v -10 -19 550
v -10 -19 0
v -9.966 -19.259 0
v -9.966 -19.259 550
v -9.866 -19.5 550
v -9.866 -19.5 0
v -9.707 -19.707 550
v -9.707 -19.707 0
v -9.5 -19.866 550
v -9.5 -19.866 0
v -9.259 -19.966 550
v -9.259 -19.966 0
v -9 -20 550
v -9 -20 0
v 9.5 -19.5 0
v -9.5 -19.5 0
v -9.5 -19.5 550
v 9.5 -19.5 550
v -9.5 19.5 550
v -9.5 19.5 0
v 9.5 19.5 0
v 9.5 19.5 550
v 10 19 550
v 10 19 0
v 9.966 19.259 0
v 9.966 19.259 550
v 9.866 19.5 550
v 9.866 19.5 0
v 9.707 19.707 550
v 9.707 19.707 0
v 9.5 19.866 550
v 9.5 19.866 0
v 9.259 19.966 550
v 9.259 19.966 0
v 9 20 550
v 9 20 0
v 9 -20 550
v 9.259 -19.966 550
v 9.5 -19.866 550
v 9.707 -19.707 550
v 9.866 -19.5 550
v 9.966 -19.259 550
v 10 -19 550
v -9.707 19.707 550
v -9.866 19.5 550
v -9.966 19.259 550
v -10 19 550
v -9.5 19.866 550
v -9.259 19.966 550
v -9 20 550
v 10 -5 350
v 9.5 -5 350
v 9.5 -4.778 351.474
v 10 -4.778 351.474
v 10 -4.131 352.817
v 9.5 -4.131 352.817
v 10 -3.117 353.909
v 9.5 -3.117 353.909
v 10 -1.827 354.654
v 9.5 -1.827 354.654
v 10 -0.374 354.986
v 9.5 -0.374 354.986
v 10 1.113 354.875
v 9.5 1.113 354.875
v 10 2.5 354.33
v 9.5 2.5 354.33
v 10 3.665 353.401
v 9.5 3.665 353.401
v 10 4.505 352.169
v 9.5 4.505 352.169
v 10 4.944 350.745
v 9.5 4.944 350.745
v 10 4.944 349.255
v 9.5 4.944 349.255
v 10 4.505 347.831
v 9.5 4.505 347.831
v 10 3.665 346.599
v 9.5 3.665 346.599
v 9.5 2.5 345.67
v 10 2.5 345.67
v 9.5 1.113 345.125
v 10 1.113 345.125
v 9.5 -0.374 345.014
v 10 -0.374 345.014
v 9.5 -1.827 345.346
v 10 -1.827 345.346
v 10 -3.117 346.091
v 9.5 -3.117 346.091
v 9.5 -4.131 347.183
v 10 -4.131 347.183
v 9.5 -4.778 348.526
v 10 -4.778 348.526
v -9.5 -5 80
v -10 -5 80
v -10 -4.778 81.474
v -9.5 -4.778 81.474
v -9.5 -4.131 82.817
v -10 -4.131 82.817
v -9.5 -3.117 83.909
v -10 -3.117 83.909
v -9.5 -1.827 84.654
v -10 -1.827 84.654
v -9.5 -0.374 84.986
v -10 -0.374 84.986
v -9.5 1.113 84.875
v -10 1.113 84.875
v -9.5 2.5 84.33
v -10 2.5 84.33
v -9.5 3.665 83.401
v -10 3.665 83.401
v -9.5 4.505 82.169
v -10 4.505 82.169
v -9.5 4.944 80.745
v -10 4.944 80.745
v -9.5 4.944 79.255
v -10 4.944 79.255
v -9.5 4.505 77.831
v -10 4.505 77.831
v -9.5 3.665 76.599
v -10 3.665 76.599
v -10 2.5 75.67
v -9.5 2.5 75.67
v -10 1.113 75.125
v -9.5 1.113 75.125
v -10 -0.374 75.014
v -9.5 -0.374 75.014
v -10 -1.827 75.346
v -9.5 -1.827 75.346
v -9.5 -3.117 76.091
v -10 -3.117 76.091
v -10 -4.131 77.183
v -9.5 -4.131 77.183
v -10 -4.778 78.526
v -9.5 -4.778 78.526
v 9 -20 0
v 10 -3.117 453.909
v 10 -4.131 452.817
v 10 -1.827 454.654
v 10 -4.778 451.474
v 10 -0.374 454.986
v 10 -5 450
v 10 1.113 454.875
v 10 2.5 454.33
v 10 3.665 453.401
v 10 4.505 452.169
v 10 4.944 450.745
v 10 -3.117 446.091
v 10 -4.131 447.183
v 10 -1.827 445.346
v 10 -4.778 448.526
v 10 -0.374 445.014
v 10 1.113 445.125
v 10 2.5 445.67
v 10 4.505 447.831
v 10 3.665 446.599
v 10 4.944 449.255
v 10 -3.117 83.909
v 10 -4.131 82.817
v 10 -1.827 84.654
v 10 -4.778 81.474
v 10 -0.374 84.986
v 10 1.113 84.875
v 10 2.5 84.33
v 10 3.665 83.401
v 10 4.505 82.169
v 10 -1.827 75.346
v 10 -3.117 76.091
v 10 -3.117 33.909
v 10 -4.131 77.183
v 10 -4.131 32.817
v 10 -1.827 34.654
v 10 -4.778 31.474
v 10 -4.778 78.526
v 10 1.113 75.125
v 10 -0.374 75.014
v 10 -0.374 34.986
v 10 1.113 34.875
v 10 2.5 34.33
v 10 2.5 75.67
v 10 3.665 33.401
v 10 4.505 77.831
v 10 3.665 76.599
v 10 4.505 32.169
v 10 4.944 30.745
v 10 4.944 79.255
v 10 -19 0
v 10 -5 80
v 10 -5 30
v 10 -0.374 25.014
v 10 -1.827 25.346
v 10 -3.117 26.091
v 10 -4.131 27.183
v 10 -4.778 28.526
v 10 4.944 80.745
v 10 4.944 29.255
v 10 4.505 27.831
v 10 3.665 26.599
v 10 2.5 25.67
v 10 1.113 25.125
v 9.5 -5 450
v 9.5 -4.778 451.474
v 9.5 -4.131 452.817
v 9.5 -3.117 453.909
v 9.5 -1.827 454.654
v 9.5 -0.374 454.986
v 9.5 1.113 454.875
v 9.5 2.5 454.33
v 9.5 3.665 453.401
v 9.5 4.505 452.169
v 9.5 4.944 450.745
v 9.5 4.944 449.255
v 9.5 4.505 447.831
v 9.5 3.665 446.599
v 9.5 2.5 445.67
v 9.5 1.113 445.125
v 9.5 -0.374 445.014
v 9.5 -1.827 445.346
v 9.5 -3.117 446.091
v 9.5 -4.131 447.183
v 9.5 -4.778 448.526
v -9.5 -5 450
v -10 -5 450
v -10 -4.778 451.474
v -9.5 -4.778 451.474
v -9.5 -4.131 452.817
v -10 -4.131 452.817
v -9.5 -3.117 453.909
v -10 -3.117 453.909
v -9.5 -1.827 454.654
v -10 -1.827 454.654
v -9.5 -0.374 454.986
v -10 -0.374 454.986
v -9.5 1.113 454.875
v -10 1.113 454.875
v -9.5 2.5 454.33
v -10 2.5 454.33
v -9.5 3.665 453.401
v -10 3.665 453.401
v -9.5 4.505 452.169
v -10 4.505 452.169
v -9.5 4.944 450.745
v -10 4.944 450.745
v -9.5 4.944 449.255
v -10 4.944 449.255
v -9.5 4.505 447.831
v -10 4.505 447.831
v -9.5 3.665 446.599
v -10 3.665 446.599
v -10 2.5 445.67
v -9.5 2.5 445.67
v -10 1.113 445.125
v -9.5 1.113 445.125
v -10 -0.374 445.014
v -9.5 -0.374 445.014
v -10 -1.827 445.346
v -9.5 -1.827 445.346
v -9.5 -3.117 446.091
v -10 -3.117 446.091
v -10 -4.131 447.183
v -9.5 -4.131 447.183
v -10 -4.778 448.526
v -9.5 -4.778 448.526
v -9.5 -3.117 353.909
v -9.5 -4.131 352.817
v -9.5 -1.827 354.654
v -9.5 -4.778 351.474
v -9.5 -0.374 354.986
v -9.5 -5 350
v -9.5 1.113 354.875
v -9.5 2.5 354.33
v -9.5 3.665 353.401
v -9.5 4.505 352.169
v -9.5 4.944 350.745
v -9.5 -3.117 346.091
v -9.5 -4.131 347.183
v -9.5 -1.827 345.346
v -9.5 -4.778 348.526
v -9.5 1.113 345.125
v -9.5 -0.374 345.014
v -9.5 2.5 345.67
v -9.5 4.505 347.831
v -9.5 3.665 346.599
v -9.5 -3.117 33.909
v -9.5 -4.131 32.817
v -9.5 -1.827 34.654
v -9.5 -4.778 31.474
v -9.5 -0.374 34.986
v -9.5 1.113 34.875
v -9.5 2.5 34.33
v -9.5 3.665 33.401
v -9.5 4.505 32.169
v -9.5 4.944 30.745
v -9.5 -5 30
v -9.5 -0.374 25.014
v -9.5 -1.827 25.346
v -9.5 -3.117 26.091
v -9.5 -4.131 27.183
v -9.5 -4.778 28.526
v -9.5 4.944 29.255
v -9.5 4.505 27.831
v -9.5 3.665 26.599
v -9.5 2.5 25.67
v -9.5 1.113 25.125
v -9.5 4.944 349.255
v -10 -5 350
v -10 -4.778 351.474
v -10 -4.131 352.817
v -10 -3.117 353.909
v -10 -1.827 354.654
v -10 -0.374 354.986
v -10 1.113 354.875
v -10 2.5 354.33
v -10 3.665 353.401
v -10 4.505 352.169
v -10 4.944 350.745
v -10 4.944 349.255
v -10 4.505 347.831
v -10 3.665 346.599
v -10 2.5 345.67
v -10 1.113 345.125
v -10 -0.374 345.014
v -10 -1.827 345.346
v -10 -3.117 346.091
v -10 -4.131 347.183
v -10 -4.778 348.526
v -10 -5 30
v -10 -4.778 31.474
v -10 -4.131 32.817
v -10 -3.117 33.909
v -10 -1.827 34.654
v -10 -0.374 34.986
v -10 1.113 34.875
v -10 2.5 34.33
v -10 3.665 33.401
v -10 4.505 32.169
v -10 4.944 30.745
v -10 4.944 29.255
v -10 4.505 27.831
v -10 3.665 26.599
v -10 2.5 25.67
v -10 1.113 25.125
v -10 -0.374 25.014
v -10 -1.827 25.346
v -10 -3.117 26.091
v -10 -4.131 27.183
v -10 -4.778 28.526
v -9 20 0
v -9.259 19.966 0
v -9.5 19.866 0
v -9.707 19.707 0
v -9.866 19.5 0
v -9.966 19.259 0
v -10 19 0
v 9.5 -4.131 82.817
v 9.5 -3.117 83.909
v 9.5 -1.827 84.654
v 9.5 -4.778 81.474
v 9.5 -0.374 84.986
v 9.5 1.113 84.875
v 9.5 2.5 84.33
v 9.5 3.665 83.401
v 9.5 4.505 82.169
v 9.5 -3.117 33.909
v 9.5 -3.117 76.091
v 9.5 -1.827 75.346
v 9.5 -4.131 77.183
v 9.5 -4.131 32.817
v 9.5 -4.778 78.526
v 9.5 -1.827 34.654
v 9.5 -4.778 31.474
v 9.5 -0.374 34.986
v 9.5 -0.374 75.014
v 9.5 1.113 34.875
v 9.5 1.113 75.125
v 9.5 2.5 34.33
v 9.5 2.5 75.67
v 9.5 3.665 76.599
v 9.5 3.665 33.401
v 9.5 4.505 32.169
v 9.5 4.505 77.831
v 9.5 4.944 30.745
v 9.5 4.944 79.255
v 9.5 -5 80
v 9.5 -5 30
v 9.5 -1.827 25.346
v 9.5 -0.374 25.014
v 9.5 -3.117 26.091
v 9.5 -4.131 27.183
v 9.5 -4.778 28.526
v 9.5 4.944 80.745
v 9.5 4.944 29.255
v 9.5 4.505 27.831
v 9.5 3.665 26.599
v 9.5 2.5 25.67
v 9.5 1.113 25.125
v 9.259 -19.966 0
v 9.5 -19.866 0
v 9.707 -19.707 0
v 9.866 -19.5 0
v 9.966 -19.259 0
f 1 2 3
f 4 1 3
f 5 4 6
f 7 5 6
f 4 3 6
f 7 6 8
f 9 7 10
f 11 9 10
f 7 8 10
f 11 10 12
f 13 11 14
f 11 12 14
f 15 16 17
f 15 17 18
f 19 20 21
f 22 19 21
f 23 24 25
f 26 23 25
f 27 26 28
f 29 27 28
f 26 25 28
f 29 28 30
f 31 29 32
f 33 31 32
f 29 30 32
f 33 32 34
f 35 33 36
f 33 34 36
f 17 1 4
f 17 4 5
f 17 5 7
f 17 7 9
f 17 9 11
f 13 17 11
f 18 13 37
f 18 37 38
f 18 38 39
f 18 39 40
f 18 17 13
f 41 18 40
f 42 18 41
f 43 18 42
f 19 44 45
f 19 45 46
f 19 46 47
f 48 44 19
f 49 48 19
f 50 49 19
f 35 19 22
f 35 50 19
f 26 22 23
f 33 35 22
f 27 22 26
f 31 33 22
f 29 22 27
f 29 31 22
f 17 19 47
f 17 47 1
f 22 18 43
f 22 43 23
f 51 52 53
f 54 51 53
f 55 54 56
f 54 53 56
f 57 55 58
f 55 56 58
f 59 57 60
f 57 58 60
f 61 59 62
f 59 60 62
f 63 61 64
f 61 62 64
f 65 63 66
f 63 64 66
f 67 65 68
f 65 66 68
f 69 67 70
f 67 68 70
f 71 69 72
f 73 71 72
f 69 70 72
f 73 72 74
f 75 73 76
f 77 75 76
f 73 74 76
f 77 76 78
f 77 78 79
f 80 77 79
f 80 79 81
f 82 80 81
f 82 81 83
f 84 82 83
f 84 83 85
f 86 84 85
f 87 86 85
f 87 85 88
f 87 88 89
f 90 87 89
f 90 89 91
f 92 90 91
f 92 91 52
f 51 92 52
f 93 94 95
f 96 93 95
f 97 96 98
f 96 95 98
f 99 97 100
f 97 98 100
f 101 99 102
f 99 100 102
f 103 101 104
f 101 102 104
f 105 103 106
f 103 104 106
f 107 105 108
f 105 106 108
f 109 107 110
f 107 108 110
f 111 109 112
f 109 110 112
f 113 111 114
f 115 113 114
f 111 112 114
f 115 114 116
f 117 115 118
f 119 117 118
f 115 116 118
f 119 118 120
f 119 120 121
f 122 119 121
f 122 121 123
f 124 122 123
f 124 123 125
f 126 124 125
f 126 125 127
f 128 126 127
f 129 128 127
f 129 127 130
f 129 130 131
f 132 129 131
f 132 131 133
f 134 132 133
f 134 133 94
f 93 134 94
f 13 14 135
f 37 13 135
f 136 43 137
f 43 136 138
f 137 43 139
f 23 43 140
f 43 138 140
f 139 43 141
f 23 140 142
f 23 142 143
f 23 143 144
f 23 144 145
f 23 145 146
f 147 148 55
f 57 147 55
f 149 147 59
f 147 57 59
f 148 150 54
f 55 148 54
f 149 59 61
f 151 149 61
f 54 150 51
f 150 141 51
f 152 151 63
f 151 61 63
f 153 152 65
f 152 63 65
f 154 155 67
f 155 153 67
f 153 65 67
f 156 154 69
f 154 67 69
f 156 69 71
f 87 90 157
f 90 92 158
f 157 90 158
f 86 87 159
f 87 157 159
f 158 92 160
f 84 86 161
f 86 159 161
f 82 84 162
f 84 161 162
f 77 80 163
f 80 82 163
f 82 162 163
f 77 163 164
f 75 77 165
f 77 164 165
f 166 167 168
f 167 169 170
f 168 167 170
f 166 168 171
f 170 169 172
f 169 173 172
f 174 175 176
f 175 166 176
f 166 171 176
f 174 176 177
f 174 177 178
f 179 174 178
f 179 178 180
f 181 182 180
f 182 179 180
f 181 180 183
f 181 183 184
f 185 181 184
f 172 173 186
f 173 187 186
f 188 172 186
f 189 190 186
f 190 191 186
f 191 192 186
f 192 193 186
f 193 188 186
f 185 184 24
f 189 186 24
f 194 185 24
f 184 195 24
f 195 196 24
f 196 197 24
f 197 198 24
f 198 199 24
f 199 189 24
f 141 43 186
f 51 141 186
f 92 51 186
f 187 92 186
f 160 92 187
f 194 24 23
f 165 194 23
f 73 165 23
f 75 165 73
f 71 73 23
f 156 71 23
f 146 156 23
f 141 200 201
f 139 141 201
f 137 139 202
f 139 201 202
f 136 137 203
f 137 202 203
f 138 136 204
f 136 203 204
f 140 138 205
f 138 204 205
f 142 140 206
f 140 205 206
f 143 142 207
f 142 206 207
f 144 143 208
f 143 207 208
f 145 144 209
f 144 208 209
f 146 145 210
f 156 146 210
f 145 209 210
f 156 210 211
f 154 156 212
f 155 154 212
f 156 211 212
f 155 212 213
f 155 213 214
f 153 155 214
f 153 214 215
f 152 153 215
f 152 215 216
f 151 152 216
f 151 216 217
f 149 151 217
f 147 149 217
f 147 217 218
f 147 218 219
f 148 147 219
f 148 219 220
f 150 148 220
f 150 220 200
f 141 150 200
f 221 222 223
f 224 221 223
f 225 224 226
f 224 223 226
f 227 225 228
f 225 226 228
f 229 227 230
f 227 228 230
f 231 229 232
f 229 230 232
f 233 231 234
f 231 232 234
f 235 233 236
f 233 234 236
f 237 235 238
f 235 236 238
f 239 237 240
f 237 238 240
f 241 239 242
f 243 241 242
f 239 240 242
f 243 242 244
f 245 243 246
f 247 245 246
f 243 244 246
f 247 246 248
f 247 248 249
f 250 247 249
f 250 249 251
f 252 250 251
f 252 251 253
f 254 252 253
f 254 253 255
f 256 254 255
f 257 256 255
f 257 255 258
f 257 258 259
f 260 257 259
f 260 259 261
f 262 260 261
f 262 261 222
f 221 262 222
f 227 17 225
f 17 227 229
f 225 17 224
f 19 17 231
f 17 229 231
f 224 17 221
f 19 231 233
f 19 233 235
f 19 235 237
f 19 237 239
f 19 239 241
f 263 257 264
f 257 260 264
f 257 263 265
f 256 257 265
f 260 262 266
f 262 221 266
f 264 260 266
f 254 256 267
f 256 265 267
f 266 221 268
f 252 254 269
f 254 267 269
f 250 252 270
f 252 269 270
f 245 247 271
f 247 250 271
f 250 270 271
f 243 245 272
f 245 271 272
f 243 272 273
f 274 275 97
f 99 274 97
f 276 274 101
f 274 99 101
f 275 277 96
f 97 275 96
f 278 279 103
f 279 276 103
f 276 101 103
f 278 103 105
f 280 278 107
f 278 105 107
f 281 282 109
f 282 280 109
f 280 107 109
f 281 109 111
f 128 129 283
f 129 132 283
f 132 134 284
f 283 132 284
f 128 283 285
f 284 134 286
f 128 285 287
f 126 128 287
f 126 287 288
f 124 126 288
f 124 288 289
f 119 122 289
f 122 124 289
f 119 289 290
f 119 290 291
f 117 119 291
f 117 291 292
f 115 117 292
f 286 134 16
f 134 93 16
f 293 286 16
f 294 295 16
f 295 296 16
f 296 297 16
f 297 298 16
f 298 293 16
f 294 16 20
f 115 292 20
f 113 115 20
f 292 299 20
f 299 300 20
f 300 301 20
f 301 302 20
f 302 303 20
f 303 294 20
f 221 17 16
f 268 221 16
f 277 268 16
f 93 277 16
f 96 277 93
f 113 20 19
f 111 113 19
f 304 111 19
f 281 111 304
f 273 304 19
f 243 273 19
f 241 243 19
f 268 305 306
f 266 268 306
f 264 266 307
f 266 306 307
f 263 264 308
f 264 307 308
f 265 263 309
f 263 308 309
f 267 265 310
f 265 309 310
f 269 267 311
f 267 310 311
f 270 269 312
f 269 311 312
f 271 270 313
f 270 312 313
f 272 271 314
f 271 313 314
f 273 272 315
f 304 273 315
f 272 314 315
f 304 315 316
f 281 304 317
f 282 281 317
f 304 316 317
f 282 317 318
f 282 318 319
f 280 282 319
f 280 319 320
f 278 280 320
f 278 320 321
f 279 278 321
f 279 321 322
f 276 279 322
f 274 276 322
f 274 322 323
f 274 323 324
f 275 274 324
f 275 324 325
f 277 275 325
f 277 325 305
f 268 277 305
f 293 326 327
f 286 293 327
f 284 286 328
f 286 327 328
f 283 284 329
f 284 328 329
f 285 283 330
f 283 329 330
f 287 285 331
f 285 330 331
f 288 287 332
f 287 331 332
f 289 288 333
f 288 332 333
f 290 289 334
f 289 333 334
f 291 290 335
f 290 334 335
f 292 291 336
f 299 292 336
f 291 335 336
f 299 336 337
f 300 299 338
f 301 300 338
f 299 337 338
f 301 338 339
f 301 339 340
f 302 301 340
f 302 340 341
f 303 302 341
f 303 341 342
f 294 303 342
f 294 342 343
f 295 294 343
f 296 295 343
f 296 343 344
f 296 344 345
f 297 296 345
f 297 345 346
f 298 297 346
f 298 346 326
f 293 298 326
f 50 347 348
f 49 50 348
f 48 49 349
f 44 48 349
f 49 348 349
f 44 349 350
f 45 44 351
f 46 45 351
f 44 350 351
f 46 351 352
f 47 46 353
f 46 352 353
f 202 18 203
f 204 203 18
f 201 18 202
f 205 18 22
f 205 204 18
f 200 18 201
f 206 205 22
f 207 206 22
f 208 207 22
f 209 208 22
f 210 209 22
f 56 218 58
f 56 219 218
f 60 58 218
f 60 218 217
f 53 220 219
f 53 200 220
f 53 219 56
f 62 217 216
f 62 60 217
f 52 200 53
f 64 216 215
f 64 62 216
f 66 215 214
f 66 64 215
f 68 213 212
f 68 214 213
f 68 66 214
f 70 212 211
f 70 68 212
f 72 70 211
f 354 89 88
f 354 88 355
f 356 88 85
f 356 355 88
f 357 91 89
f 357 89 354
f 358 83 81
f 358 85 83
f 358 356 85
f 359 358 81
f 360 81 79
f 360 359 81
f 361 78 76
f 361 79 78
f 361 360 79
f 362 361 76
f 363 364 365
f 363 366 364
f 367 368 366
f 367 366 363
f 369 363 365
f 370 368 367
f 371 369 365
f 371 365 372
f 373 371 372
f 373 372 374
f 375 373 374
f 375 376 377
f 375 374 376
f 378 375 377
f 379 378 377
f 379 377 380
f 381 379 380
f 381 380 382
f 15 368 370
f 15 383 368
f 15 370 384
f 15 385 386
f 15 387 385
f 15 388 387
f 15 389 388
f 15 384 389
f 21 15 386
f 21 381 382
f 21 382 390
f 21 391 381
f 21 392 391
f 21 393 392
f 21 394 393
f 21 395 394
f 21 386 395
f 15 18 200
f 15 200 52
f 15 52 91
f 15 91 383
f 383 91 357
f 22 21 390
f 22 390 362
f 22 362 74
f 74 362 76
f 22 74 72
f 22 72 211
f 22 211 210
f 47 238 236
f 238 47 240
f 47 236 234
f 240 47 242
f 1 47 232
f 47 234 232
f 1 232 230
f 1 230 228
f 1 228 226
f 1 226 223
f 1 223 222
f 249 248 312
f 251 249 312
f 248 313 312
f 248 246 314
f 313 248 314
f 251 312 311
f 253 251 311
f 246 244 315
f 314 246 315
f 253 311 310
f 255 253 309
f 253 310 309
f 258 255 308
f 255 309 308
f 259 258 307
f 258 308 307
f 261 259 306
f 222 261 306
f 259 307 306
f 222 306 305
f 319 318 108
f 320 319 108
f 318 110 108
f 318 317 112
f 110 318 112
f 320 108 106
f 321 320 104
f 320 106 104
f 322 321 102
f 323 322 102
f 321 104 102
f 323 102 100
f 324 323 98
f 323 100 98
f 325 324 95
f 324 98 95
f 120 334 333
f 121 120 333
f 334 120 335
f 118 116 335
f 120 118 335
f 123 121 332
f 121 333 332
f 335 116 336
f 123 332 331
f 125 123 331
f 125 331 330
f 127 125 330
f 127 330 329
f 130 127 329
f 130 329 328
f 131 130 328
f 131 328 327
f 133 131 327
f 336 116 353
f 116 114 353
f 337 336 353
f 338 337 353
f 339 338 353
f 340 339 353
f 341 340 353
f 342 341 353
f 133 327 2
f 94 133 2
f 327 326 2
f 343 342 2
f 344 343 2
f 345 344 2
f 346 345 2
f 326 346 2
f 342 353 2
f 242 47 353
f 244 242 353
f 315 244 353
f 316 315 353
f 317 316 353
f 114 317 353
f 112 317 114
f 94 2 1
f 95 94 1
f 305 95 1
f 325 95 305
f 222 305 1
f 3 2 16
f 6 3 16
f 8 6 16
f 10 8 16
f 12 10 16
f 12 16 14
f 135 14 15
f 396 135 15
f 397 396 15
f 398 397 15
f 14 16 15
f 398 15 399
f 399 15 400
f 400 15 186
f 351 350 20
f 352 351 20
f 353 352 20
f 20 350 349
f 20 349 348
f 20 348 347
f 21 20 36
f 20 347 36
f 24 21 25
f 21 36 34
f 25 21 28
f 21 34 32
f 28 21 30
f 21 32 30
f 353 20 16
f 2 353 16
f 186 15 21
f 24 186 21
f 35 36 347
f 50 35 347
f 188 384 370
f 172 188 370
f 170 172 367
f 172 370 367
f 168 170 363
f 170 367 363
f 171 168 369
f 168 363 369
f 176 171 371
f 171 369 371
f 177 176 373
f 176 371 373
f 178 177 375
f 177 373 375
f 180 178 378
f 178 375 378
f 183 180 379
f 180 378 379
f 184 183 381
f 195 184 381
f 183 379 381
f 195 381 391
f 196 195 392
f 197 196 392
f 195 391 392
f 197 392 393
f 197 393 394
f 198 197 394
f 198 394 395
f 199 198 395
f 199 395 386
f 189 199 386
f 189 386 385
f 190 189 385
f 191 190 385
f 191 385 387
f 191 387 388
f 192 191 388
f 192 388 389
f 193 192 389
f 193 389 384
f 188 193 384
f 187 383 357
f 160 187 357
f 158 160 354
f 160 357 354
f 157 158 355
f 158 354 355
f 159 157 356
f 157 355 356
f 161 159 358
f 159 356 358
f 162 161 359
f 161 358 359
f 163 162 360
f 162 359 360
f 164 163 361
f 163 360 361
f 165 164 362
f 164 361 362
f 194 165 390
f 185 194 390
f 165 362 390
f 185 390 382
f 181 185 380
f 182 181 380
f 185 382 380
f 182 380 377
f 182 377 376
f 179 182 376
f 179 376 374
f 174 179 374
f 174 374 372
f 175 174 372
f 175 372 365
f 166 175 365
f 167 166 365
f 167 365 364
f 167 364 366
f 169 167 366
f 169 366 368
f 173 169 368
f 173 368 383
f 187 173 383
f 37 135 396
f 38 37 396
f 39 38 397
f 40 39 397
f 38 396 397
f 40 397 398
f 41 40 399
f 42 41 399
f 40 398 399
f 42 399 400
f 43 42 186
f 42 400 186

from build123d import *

# Parameters (mm, degrees)
F0_W     = 19
F0_H     = 39
F1_DEPTH = 550
F3_D     = 10
F3_DEPTH = 30
F3_TIP   = 3.0043030951


# Not quite as in the source:
# - a feature names something its author has since deleted; it is built from what else it names


with BuildPart() as f1:
    # F0 (on Top) → F1 (new body)
    with BuildSketch(Plane.XY):
        with BuildLine():
            Line((9, 20), (-9, 20))
            ThreePointArc((-9, 20), (-9.7071067812, 19.7071067812), (-10, 19))
            Line((-10, 19), (-10, -19))
            ThreePointArc((-10, -19), (-9.7071067812, -19.7071067812), (-9, -20))
            Line((-9, -20), (9, -20))
            ThreePointArc((9, -20), (9.7071067812, -19.7071067812), (10, -19))
            Line((10, -19), (10, 19))
            ThreePointArc((10, 19), (9.7071067812, 19.7071067812), (9, 20))
        make_face()
        Rectangle(F0_W, F0_H, mode=Mode.SUBTRACT)
    extrude(amount=F1_DEPTH)

    # F3
    with Locations(Plane.YZ.offset(10)):
        with Locations((0, 80), (0, 30), (0, 450), (0, 350)):
            Hole(F3_D / 2, depth=F3_DEPTH)
            with Locations((0, 0, -(F3_DEPTH + F3_TIP / 2))):  # 118° drill point
                Cone(0, F3_D / 2, F3_TIP, mode=Mode.SUBTRACT)


solid = f1.part
